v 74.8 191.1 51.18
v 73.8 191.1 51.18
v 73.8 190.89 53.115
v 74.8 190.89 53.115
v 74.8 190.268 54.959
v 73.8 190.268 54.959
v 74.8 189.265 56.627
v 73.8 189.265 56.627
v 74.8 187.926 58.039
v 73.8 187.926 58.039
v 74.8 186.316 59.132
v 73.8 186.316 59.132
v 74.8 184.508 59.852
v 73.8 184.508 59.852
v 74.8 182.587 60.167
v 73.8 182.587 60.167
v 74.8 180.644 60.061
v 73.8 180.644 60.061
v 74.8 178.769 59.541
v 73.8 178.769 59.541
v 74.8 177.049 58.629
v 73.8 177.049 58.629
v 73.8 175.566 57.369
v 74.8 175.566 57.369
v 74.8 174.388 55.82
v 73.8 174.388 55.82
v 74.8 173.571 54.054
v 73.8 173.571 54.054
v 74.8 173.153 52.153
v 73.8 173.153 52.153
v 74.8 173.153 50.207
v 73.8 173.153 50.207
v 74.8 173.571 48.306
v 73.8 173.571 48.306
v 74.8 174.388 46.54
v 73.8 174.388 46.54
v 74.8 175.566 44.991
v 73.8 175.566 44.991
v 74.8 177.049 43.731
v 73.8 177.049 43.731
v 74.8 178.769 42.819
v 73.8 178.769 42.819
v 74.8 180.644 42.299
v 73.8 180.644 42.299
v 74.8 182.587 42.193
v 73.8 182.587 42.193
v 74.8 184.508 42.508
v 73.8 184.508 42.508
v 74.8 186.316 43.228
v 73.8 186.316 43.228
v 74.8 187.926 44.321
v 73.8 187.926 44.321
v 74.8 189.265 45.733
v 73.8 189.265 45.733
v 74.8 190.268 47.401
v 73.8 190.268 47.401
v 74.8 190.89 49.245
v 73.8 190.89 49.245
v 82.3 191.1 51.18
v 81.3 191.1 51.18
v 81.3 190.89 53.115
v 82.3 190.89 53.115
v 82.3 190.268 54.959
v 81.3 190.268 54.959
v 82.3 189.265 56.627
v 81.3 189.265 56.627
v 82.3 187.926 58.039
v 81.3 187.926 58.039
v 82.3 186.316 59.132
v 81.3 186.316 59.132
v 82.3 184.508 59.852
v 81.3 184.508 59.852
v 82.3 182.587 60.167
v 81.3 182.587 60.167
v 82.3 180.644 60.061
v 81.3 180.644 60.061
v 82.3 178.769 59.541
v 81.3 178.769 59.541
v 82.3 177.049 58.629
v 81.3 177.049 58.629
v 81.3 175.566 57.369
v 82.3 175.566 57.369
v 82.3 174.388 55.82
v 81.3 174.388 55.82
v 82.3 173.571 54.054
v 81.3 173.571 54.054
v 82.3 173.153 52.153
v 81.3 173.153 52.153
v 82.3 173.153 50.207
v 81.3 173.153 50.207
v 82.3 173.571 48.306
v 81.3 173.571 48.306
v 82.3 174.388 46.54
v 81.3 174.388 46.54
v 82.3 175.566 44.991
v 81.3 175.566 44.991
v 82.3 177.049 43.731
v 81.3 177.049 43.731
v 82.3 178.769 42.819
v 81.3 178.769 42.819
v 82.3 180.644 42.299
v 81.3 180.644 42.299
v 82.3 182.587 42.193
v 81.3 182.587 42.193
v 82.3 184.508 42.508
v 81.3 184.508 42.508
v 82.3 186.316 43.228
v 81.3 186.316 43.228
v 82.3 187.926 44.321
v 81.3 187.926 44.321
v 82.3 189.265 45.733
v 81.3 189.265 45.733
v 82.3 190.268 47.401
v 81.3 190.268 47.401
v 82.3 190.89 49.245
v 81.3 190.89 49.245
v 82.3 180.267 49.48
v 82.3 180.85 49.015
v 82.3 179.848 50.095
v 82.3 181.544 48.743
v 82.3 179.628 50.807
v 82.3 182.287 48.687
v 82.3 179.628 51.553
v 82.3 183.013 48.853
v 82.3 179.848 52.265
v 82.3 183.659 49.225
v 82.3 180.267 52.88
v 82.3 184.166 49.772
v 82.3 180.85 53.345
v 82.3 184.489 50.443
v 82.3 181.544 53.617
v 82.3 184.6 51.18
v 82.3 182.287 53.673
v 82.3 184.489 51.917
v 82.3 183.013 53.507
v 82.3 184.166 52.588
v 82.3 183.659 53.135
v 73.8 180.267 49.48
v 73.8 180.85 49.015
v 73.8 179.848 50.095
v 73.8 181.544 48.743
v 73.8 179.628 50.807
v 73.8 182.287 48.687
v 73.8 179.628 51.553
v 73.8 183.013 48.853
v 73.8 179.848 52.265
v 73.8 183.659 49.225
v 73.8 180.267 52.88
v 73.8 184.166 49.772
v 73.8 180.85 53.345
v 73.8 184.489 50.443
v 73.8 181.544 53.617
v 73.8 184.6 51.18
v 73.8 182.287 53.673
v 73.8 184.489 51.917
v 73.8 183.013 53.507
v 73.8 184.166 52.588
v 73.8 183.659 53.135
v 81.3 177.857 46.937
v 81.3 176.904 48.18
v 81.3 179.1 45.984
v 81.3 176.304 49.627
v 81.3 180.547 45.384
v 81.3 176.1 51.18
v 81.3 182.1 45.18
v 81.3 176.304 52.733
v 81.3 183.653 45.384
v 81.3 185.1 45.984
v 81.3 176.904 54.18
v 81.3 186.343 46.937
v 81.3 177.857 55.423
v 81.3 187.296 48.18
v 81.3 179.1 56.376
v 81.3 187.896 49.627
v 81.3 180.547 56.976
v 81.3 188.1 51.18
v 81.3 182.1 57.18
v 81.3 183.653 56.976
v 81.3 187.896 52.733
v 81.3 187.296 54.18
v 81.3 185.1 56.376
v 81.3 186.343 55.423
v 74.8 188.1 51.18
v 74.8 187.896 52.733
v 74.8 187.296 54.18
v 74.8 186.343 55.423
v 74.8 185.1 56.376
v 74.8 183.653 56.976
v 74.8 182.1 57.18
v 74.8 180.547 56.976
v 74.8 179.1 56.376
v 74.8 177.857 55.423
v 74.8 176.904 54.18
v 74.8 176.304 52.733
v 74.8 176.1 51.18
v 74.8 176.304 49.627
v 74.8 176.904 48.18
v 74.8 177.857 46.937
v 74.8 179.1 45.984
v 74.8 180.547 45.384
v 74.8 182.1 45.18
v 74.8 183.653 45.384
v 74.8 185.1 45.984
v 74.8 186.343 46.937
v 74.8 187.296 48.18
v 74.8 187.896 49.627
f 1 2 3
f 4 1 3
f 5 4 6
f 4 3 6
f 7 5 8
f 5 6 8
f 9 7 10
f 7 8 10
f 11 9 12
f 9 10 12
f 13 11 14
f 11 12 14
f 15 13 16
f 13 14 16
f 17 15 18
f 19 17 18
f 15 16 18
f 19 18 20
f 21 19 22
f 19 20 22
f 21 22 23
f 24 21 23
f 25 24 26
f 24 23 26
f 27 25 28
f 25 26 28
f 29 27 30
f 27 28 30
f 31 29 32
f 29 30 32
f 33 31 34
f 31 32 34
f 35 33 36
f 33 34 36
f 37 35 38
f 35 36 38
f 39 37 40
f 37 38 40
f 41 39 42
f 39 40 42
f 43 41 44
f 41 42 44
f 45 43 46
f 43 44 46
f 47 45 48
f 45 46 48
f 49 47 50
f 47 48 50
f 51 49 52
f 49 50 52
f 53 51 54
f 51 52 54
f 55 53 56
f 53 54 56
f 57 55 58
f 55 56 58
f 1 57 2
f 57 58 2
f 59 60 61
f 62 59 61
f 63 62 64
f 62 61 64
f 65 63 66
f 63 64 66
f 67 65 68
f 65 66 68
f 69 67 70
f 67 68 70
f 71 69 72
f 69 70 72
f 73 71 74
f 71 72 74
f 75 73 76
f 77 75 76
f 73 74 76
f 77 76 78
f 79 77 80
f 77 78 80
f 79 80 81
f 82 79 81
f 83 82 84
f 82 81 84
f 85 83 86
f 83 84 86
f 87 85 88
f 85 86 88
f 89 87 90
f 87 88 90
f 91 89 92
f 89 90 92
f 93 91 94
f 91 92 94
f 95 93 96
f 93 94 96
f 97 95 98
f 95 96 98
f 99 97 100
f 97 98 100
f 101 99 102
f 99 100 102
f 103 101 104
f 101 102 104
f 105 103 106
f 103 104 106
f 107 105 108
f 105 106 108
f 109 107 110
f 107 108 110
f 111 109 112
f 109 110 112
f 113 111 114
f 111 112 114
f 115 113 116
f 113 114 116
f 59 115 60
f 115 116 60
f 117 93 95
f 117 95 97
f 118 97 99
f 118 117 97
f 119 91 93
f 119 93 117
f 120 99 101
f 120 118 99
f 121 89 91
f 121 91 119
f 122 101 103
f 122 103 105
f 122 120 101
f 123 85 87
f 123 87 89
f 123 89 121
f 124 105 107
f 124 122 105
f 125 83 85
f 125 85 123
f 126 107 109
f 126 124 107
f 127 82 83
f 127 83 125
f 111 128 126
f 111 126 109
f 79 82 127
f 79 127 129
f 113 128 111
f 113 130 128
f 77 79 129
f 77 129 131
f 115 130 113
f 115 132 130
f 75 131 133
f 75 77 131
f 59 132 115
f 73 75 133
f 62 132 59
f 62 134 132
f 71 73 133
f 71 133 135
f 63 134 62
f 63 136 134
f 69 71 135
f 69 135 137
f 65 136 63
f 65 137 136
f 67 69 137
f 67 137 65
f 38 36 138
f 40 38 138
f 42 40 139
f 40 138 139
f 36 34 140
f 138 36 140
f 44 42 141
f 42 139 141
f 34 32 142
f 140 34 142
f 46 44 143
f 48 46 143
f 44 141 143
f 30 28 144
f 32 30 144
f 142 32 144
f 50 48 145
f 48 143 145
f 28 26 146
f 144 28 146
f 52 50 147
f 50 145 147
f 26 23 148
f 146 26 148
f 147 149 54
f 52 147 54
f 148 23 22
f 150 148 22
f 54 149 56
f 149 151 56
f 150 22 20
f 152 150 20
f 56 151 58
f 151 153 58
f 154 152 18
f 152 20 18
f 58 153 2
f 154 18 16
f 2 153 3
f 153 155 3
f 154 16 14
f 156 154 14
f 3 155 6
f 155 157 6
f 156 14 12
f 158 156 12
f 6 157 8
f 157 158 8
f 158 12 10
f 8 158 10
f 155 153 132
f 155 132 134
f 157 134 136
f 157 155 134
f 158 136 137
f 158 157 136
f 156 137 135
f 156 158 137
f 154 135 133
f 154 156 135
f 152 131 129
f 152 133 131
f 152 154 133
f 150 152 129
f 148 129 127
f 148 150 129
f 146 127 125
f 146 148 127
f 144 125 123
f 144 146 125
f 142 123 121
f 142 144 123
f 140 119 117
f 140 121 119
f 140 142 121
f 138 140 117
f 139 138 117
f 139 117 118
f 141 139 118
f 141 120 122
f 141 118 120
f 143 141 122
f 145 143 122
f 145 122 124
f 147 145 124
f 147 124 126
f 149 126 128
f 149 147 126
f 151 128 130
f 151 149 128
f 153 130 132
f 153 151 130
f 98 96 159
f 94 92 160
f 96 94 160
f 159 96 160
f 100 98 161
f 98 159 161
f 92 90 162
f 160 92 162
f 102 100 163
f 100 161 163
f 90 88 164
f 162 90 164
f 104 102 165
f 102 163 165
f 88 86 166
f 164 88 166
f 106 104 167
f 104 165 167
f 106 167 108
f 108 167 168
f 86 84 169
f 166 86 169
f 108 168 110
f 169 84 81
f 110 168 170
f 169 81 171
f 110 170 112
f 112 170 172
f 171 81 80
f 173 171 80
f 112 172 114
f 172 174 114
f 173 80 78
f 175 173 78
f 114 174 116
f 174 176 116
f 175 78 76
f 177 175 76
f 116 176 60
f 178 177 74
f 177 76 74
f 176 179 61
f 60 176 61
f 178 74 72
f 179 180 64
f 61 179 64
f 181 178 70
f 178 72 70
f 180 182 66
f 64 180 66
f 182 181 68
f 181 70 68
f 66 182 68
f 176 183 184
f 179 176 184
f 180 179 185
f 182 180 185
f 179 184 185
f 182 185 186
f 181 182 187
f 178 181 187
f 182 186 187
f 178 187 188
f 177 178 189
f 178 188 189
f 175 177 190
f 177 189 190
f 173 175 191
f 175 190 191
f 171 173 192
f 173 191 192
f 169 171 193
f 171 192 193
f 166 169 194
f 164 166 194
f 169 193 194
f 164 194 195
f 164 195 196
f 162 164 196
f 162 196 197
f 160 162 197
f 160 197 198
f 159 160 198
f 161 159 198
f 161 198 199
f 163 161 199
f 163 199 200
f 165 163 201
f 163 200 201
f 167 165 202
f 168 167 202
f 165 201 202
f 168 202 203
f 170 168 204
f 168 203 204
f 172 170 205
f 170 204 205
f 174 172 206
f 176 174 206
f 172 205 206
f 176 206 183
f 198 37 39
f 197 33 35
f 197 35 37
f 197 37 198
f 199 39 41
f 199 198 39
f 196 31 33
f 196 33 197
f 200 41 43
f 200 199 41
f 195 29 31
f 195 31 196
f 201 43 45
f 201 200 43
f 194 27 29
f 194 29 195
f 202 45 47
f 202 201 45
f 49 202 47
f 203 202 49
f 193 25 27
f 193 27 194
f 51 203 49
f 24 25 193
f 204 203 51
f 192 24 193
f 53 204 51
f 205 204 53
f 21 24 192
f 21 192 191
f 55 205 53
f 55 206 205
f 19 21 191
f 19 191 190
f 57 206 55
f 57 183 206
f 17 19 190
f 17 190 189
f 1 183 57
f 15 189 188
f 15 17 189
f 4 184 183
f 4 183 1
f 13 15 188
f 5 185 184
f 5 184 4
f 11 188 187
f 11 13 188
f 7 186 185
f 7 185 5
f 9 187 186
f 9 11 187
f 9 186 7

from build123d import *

# Parameters (mm, degrees)
CYLINDER286_R          = 2.5
CYLINDER286_DEPTH      = 14.5
CYLINDER289_R          = 6
CYLINDER289_DEPTH      = 6.5
CYLINDER288_R          = 9
CYLINDER288_DEPTH      = 1
CYLINDER287_R          = 9
CYLINDER287_DEPTH      = 1
CUT203_ROLL_ANGLE      = 90
CUT203_PLACEMENT_ANGLE = 90


with BuildPart() as cylinder286:
    # Cylinder286 → Cylinder286 (new body)
    with BuildSketch(Plane.XY.offset(-2.4)):
        Circle(CYLINDER286_R)
    extrude(amount=CYLINDER286_DEPTH)


with BuildPart() as cylinder289:
    # Cylinder289 → Cylinder289 (new body)
    with BuildSketch(Plane.XY.offset(1)):
        Circle(CYLINDER289_R)
    extrude(amount=CYLINDER289_DEPTH)


with BuildPart() as cylinder288:
    # Cylinder288 → Cylinder288 (new body)
    with BuildSketch(Plane.XY.offset(7.5)):
        Circle(CYLINDER288_R)
    extrude(amount=CYLINDER288_DEPTH)


with BuildPart() as cut203:
    # Cylinder287 → Cylinder287 (new body)
    with BuildSketch(Plane.XY):
        Circle(CYLINDER287_R)
    extrude(amount=CYLINDER287_DEPTH)

    # Fusion109: union Cylinder289, Cylinder288
    add(cylinder289.part)
    add(cylinder288.part)

    # Cut203: cut Cylinder286
    add(cylinder286.part, mode=Mode.SUBTRACT)


with BuildPart() as cut203_1:
    # Cut203 roll: moved
    add(cut203.part.rotate(Axis((0, 0, 0), (1, 0, 0)), CUT203_ROLL_ANGLE))


with BuildPart() as cut203_2:
    # Cut203 placement: moved
    add(cut203_1.part.moved(Location((73.8, 182.1, 51.18))).rotate(Axis((73.8, 182.1, 51.18), (0, 0, 1)), CUT203_PLACEMENT_ANGLE))


solid = cut203_2.part
